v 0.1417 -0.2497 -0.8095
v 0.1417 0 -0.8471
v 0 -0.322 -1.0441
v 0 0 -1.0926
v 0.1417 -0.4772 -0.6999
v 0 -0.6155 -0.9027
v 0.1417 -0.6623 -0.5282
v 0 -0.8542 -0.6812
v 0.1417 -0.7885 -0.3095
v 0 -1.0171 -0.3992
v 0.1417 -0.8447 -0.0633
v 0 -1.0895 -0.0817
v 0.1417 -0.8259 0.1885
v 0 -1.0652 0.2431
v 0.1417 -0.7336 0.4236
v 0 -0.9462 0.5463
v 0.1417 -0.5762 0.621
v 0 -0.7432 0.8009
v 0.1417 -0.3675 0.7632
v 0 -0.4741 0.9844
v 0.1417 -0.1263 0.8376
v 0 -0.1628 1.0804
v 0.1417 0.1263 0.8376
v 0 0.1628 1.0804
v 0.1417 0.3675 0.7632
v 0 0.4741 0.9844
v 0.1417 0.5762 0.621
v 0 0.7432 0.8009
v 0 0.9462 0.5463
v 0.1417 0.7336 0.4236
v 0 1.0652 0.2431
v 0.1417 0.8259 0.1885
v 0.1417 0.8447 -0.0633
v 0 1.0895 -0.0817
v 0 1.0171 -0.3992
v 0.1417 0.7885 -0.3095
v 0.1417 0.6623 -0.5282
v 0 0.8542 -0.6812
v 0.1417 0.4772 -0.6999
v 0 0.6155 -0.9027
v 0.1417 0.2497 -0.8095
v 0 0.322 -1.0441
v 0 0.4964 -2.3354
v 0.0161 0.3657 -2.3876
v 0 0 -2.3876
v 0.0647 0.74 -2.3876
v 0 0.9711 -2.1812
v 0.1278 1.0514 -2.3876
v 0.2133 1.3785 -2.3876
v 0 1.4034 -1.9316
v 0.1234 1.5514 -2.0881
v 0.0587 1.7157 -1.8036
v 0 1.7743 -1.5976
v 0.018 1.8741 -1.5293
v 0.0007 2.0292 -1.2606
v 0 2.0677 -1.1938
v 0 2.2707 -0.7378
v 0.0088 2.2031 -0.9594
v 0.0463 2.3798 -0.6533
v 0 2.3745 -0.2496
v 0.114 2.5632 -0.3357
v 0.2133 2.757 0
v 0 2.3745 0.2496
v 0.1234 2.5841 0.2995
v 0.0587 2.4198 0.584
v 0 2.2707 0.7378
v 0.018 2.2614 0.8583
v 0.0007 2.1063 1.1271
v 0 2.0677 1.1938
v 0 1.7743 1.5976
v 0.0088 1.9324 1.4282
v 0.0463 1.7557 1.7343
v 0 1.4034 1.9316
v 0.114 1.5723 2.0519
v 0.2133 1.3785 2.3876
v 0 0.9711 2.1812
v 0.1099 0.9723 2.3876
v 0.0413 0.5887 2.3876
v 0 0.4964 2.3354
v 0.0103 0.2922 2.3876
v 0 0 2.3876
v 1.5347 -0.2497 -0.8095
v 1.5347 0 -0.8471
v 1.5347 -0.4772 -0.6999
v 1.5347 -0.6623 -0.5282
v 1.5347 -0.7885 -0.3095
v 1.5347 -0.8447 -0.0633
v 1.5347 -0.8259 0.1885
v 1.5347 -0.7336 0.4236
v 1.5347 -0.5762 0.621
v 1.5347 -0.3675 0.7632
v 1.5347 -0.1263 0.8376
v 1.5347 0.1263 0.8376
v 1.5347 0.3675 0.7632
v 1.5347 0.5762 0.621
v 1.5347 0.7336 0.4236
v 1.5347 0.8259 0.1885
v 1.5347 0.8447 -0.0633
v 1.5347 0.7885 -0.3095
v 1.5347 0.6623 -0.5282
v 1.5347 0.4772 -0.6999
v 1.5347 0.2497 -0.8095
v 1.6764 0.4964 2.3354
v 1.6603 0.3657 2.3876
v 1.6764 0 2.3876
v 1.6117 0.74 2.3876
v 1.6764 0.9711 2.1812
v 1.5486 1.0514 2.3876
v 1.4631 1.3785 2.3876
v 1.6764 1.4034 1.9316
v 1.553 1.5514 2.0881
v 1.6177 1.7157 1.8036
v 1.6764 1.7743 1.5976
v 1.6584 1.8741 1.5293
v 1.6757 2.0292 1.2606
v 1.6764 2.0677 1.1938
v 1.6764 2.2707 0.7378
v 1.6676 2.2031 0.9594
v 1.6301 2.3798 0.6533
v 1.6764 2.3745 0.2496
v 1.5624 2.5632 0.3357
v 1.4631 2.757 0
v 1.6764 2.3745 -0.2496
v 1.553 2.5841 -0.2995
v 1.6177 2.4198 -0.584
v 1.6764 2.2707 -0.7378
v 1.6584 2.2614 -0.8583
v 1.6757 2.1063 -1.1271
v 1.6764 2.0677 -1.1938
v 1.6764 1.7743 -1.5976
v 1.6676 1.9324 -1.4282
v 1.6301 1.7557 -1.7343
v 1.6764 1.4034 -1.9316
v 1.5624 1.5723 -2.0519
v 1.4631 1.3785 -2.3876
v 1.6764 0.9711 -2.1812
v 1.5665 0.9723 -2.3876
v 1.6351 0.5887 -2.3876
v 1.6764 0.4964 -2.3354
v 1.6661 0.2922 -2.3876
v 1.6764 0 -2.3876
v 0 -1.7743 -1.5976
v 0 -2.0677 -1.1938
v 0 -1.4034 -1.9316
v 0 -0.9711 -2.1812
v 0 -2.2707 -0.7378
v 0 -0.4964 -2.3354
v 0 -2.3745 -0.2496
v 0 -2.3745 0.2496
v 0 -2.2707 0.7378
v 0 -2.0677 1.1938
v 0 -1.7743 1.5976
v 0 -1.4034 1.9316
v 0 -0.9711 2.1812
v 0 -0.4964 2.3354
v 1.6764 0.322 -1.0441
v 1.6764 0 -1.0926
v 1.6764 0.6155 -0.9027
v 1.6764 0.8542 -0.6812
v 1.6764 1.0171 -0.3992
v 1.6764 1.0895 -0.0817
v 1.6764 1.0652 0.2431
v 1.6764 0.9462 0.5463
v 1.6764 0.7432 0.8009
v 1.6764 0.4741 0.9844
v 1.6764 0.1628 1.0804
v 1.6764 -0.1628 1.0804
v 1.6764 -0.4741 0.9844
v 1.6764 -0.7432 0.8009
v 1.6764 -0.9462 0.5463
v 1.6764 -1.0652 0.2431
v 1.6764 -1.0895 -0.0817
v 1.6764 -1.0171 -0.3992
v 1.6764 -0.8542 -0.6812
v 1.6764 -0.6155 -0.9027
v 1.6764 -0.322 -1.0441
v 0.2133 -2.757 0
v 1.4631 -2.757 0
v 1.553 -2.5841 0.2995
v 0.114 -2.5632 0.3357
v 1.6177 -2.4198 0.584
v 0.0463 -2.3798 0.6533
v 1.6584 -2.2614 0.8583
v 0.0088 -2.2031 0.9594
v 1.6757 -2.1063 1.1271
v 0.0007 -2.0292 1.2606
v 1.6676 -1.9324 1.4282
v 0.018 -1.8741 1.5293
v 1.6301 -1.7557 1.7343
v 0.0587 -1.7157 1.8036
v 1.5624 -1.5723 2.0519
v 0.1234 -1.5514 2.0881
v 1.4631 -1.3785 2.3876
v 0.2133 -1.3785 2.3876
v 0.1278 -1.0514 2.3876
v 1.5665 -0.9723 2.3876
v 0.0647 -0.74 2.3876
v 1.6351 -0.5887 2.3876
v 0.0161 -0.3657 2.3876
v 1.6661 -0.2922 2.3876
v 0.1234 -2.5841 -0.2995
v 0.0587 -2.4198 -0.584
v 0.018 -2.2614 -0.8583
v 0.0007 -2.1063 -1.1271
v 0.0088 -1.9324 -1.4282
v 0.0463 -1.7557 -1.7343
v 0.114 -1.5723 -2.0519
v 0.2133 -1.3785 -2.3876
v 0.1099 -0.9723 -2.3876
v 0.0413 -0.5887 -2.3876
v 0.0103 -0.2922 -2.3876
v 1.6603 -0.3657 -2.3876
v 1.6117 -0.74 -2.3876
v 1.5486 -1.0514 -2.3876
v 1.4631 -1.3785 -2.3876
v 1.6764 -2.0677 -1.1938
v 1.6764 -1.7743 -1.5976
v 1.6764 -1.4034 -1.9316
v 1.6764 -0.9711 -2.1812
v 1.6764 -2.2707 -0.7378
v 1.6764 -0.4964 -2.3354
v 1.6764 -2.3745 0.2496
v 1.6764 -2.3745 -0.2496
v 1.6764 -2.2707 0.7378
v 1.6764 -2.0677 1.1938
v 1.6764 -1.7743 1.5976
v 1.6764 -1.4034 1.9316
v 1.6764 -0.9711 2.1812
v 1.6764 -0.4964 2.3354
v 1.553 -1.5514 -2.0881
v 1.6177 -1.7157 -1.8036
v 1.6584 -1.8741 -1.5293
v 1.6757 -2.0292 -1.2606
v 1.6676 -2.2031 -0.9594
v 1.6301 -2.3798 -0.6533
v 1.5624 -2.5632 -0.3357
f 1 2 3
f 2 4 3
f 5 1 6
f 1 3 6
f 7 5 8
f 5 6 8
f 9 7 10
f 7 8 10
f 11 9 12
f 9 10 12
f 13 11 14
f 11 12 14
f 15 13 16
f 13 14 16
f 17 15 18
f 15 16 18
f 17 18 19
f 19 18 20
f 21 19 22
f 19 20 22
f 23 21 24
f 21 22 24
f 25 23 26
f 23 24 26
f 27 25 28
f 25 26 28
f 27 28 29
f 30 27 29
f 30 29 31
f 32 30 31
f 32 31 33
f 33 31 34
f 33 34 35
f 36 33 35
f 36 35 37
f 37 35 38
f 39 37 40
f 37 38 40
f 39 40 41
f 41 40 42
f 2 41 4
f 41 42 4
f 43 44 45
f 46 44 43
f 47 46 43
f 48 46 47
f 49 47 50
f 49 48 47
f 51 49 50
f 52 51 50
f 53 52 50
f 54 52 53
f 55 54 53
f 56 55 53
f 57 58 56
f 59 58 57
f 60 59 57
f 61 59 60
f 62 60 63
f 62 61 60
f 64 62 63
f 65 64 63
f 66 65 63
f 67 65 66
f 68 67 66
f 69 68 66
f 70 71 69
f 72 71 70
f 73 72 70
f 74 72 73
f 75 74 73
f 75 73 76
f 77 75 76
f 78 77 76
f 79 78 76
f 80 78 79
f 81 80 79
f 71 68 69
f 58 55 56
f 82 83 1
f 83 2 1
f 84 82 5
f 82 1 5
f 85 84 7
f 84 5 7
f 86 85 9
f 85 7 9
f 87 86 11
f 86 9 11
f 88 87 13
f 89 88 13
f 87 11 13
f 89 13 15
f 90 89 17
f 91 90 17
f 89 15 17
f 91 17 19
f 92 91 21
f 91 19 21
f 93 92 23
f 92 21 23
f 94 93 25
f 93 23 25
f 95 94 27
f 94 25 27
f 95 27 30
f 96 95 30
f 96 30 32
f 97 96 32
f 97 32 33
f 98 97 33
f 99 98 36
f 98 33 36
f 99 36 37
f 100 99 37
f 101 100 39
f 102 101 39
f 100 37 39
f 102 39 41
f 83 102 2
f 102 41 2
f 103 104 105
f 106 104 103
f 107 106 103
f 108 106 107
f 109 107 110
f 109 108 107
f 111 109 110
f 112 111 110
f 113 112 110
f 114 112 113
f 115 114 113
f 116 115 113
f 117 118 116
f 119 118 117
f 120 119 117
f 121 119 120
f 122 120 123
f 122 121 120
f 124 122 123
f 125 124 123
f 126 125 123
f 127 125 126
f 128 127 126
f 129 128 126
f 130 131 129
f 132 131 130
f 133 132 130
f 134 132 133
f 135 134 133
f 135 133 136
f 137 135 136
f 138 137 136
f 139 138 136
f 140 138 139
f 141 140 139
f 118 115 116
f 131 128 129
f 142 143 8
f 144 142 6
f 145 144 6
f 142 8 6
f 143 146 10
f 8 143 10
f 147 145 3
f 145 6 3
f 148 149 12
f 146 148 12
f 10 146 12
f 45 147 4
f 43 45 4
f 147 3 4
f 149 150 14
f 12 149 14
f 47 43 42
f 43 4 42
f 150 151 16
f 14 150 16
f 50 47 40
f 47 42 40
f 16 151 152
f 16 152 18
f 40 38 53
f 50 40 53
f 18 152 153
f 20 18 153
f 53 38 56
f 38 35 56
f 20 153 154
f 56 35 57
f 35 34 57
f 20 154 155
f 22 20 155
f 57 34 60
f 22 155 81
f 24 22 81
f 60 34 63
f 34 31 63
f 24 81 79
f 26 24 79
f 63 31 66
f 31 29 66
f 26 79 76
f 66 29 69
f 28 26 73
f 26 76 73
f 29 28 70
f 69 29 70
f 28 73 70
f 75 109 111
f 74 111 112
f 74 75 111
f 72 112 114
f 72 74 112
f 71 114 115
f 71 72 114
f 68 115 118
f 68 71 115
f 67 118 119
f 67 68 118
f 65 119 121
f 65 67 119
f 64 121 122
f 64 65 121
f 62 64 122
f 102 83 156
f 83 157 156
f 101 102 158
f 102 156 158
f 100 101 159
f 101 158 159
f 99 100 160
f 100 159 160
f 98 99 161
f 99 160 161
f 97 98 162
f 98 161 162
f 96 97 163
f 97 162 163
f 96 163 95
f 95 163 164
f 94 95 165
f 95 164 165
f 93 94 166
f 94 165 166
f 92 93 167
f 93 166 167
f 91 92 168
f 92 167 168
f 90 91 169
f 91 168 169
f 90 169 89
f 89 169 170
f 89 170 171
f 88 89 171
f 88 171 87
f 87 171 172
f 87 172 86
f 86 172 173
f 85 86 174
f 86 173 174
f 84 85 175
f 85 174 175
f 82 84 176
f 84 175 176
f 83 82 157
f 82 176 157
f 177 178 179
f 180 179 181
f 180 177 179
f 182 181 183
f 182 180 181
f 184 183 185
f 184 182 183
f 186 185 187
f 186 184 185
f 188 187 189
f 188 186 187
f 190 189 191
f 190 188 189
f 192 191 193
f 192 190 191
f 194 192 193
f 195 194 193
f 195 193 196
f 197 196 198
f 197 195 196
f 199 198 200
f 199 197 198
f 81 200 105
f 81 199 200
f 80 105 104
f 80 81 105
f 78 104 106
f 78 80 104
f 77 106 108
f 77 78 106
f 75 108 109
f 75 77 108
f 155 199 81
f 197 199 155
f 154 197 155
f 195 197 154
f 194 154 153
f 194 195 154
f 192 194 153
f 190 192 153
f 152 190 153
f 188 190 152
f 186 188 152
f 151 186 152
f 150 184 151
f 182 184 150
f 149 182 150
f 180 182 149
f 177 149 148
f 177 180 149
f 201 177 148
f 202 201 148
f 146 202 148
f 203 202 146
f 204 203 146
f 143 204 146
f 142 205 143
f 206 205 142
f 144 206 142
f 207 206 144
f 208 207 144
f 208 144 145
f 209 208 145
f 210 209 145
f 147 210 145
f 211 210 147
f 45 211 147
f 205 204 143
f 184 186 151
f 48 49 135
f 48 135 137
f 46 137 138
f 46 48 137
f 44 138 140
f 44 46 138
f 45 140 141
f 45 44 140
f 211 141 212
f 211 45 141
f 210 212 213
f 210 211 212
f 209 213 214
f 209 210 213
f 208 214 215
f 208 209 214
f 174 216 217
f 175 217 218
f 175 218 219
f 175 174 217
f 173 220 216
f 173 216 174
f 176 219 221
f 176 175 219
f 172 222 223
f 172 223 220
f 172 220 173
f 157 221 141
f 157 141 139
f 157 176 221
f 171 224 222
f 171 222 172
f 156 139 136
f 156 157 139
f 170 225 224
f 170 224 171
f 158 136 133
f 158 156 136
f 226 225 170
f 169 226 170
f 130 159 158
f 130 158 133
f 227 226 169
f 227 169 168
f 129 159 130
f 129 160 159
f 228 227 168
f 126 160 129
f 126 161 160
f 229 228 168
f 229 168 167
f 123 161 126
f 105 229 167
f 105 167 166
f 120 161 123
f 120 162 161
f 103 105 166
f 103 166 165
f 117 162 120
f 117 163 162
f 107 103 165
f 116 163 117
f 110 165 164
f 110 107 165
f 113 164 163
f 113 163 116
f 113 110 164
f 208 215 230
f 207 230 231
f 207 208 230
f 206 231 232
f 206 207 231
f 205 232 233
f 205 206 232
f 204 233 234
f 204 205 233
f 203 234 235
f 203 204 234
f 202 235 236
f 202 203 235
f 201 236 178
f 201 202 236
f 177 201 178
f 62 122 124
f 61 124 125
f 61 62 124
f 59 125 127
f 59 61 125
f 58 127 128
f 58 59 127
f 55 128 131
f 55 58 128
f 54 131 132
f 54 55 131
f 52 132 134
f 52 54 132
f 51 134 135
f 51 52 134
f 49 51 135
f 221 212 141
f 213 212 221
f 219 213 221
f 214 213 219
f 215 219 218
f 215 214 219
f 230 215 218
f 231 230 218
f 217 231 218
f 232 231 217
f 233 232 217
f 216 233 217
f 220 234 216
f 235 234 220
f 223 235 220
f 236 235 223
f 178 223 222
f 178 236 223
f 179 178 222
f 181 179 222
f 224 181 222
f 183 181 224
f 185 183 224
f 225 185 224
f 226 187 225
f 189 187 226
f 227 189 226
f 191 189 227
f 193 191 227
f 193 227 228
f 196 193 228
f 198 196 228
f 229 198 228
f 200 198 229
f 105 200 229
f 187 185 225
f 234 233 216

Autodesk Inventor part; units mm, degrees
ref_plane "YZ Plane" through (0, 0, 0) normal (1, 0, 0) x (0, 1, 0)
ref_plane "XZ Plane" through (0, 0, 0) normal (0, 1, 0) x (-1, 0, 0)
sketch "Sketch1" plane through (0, 0, 0) normal (1, 0, 0) x (0, 1, 0)
  line L0 (-2.757, 0) -> (-1.3785, 2.3876)
  line L1 (-1.3785, 2.3876) -> (1.3785, 2.3876)
  line L2 (1.3785, 2.3876) -> (2.757, 0)
  line L3 (2.757, 0) -> (1.3785, -2.3876)
  line L4 (1.3785, -2.3876) -> (-1.3785, -2.3876)
  line L5 (-1.3785, -2.3876) -> (-2.757, 0)
  point P0 (0, 0)
  point P1 (0, 0)
  dimension "d0" = 5.5139
extrude "Body" add sketch "Sketch1" along normal blind 1.6764
sketch "Sketch2" plane through (0, 0, 0) normal (0, 0, 1) x (1, 0, 0)
  line L0 (0, 1.3785) -> (0, 2.757) projected
  line L1 (0, 2.757) -> (1.6764, 2.757) projected
  line L2 (1.6764, 1.3785) -> (1.6764, 2.757) projected
  line L3 (-0.3353, 0) -> (2.0117, 0) projected
  line L4 (0.2133, 2.757) -> (0, 2.3876)
  line L5 (1.4631, 2.757) -> (1.6764, 2.3876)
  dimension "d3" = 30
  dimension "d4" = 30
  dimension "d5" = 4.7752
  dimension "d6" = 4.7752
revolve "Chamfer1" cut sketch "Sketch2" angle 360 about axis through (-10, 0, 0) along (1, 0, 0)
sketch "Sketch3" plane through (1.6764, 0, 0) normal (1, 0, 0) x (0, 0, -1)
  arc A0 (-1.1938, -2.0677) -> (1.1938, -2.0677) centre (0, 0) ccw projected
hole "Thread" at (1.6764, 0, 0) direction (-1, 0, 0) diameter 1.6942 end through all thread size "2-56 UNC" class "2B" standard "ANSI Unified Screw Threads"
chamfer "Chamfer2" distance 0.2455 angle 30 1 edges at (1.6764, 0, 0.8471) measured on face at (1.6764, -1.8633, -0.034)
chamfer "Chamfer3" distance 0.2455 angle 30 1 edges at (0, 0, 0.8471) measured on face at (0, -1.8633, -0.034)
ref_plane "Work Plane1" through (-5.808, 0, 0) normal (0, -0.866, -0.5) x (1, 0, 0)
equation "\"d0\" = 1.1547 * SW"
equation "\"d1\" = KOH"
equation "\"d3\" = ANG1"
equation "\"d4\" = ANG2"
equation "\"d5\" = SW0"
equation "\"d6\" = SW01"
equation "\"d8\" = -0.5 * GD1 + 0.5 * NND"
equation "\"d40\" = -0.5 * GD1 + 0.5 * NND"
equation "\"d10\" = -0.5 * GD1 + 0.5 * NND"
equation "\"d41\" = -0.5 * GD1 + 0.5 * NND"
equation "\"ANG1\" = 30deg"
equation "\"ANG2\" = 30deg"
equation "\"NND\" = 2.1844"
equation "\"KOH\" = 1.6764"
equation "\"SW\" = 4.7752"
equation "\"SW0\" = SW"
equation "\"SW01\" = SW"
equation "\"THREADDIA\" = 2.1844"
equation "\"TOA\" = 30deg"
equation "\"E0\" = 1.155 * SW"
equation "\"GD1\" = 1.693395"
properties part number "ANSI B18.2.2 - 2 - 56, HMSNI" material "Steel, Mild"
